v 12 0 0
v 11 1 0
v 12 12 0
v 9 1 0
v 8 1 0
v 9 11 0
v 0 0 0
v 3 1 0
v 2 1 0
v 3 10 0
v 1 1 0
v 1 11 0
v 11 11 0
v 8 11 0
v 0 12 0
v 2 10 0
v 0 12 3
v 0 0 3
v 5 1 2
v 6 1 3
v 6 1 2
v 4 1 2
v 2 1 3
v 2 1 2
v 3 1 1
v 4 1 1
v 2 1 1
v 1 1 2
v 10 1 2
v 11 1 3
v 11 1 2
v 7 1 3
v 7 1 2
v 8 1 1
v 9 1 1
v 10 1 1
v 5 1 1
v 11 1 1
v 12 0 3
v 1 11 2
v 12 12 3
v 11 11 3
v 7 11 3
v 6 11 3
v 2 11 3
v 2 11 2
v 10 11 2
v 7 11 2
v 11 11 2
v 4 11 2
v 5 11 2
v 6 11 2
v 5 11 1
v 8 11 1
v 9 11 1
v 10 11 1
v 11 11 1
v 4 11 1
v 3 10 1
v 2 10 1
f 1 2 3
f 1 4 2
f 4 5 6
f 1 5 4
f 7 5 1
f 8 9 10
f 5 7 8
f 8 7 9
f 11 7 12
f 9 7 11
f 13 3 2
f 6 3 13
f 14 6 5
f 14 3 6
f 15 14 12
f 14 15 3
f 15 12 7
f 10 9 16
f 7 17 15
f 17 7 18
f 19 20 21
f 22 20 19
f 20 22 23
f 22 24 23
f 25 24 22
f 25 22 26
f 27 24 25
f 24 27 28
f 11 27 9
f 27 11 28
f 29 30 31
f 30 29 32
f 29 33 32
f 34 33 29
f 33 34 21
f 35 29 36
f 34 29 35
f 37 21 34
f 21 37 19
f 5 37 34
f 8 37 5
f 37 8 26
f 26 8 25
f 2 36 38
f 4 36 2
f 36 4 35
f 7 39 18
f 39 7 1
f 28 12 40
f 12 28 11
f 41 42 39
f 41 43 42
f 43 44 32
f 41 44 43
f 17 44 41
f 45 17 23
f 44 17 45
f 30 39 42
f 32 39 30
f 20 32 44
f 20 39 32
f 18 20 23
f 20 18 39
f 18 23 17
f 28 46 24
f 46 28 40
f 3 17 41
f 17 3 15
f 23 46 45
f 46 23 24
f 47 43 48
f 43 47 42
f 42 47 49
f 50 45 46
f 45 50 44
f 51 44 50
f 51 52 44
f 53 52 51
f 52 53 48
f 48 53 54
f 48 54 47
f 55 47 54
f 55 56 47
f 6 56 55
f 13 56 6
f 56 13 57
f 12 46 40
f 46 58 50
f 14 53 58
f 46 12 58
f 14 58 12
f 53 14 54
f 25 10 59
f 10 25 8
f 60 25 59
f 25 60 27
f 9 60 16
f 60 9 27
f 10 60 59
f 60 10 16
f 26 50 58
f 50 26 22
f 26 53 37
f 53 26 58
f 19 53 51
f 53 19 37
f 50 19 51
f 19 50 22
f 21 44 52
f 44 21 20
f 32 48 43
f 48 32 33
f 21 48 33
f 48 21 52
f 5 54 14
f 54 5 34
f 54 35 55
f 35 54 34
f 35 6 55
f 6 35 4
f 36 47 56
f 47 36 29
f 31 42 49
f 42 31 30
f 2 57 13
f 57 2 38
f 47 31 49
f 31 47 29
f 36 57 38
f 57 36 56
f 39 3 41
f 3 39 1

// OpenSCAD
union() {
    translate([0, 0, 0]) cube([1, 1, 1]);
    translate([0, 0, 1]) cube([1, 1, 1]);
    translate([0, 0, 2]) cube([1, 1, 1]);
    translate([0, 1, 0]) cube([1, 1, 1]);
    translate([0, 1, 1]) cube([1, 1, 1]);
    translate([0, 1, 2]) cube([1, 1, 1]);
    translate([0, 2, 0]) cube([1, 1, 1]);
    translate([0, 2, 1]) cube([1, 1, 1]);
    translate([0, 2, 2]) cube([1, 1, 1]);
    translate([0, 3, 0]) cube([1, 1, 1]);
    translate([0, 3, 1]) cube([1, 1, 1]);
    translate([0, 3, 2]) cube([1, 1, 1]);
    translate([0, 4, 0]) cube([1, 1, 1]);
    translate([0, 4, 1]) cube([1, 1, 1]);
    translate([0, 4, 2]) cube([1, 1, 1]);
    translate([0, 5, 0]) cube([1, 1, 1]);
    translate([0, 5, 1]) cube([1, 1, 1]);
    translate([0, 5, 2]) cube([1, 1, 1]);
    translate([0, 6, 0]) cube([1, 1, 1]);
    translate([0, 6, 1]) cube([1, 1, 1]);
    translate([0, 6, 2]) cube([1, 1, 1]);
    translate([0, 7, 0]) cube([1, 1, 1]);
    translate([0, 7, 1]) cube([1, 1, 1]);
    translate([0, 7, 2]) cube([1, 1, 1]);
    translate([0, 8, 0]) cube([1, 1, 1]);
    translate([0, 8, 1]) cube([1, 1, 1]);
    translate([0, 8, 2]) cube([1, 1, 1]);
    translate([0, 9, 0]) cube([1, 1, 1]);
    translate([0, 9, 1]) cube([1, 1, 1]);
    translate([0, 9, 2]) cube([1, 1, 1]);
    translate([0, 10, 0]) cube([1, 1, 1]);
    translate([0, 10, 1]) cube([1, 1, 1]);
    translate([0, 10, 2]) cube([1, 1, 1]);
    translate([0, 11, 0]) cube([1, 1, 1]);
    translate([0, 11, 1]) cube([1, 1, 1]);
    translate([0, 11, 2]) cube([1, 1, 1]);
    translate([1, 0, 0]) cube([1, 1, 1]);
    translate([1, 0, 1]) cube([1, 1, 1]);
    translate([1, 0, 2]) cube([1, 1, 1]);
    translate([1, 1, 2]) cube([1, 1, 1]);
    translate([1, 2, 2]) cube([1, 1, 1]);
    translate([1, 3, 2]) cube([1, 1, 1]);
    translate([1, 4, 2]) cube([1, 1, 1]);
    translate([1, 5, 2]) cube([1, 1, 1]);
    translate([1, 6, 2]) cube([1, 1, 1]);
    translate([1, 7, 2]) cube([1, 1, 1]);
    translate([1, 8, 2]) cube([1, 1, 1]);
    translate([1, 9, 2]) cube([1, 1, 1]);
    translate([1, 10, 2]) cube([1, 1, 1]);
    translate([1, 11, 0]) cube([1, 1, 1]);
    translate([1, 11, 1]) cube([1, 1, 1]);
    translate([1, 11, 2]) cube([1, 1, 1]);
    translate([2, 0, 0]) cube([1, 1, 1]);
    translate([2, 0, 1]) cube([1, 1, 1]);
    translate([2, 0, 2]) cube([1, 1, 1]);
    translate([2, 1, 0]) cube([1, 1, 1]);
    translate([2, 2, 0]) cube([1, 1, 1]);
    translate([2, 3, 0]) cube([1, 1, 1]);
    translate([2, 4, 0]) cube([1, 1, 1]);
    translate([2, 5, 0]) cube([1, 1, 1]);
    translate([2, 6, 0]) cube([1, 1, 1]);
    translate([2, 7, 0]) cube([1, 1, 1]);
    translate([2, 8, 0]) cube([1, 1, 1]);
    translate([2, 9, 0]) cube([1, 1, 1]);
    translate([2, 11, 0]) cube([1, 1, 1]);
    translate([2, 11, 1]) cube([1, 1, 1]);
    translate([2, 11, 2]) cube([1, 1, 1]);
    translate([3, 0, 0]) cube([1, 1, 1]);
    translate([3, 0, 1]) cube([1, 1, 1]);
    translate([3, 0, 2]) cube([1, 1, 1]);
    translate([3, 11, 0]) cube([1, 1, 1]);
    translate([3, 11, 1]) cube([1, 1, 1]);
    translate([3, 11, 2]) cube([1, 1, 1]);
    translate([4, 0, 0]) cube([1, 1, 1]);
    translate([4, 0, 1]) cube([1, 1, 1]);
    translate([4, 0, 2]) cube([1, 1, 1]);
    translate([4, 1, 1]) cube([1, 1, 1]);
    translate([4, 2, 1]) cube([1, 1, 1]);
    translate([4, 3, 1]) cube([1, 1, 1]);
    translate([4, 4, 1]) cube([1, 1, 1]);
    translate([4, 5, 1]) cube([1, 1, 1]);
    translate([4, 6, 1]) cube([1, 1, 1]);
    translate([4, 7, 1]) cube([1, 1, 1]);
    translate([4, 8, 1]) cube([1, 1, 1]);
    translate([4, 9, 1]) cube([1, 1, 1]);
    translate([4, 10, 1]) cube([1, 1, 1]);
    translate([4, 11, 0]) cube([1, 1, 1]);
    translate([4, 11, 1]) cube([1, 1, 1]);
    translate([4, 11, 2]) cube([1, 1, 1]);
    translate([5, 0, 0]) cube([1, 1, 1]);
    translate([5, 0, 1]) cube([1, 1, 1]);
    translate([5, 0, 2]) cube([1, 1, 1]);
    translate([5, 11, 0]) cube([1, 1, 1]);
    translate([5, 11, 1]) cube([1, 1, 1]);
    translate([5, 11, 2]) cube([1, 1, 1]);
    translate([6, 0, 0]) cube([1, 1, 1]);
    translate([6, 0, 1]) cube([1, 1, 1]);
    translate([6, 0, 2]) cube([1, 1, 1]);
    translate([6, 1, 2]) cube([1, 1, 1]);
    translate([6, 2, 2]) cube([1, 1, 1]);
    translate([6, 3, 2]) cube([1, 1, 1]);
    translate([6, 4, 2]) cube([1, 1, 1]);
    translate([6, 5, 2]) cube([1, 1, 1]);
    translate([6, 6, 2]) cube([1, 1, 1]);
    translate([6, 7, 2]) cube([1, 1, 1]);
    translate([6, 8, 2]) cube([1, 1, 1]);
    translate([6, 9, 2]) cube([1, 1, 1]);
    translate([6, 10, 2]) cube([1, 1, 1]);
    translate([6, 11, 0]) cube([1, 1, 1]);
    translate([6, 11, 1]) cube([1, 1, 1]);
    translate([6, 11, 2]) cube([1, 1, 1]);
    translate([7, 0, 0]) cube([1, 1, 1]);
    translate([7, 0, 1]) cube([1, 1, 1]);
    translate([7, 0, 2]) cube([1, 1, 1]);
    translate([7, 11, 0]) cube([1, 1, 1]);
    translate([7, 11, 1]) cube([1, 1, 1]);
    translate([7, 11, 2]) cube([1, 1, 1]);
    translate([8, 0, 0]) cube([1, 1, 1]);
    translate([8, 0, 1]) cube([1, 1, 1]);
    translate([8, 0, 2]) cube([1, 1, 1]);
    translate([8, 1, 0]) cube([1, 1, 1]);
    translate([8, 2, 0]) cube([1, 1, 1]);
    translate([8, 3, 0]) cube([1, 1, 1]);
    translate([8, 4, 0]) cube([1, 1, 1]);
    translate([8, 5, 0]) cube([1, 1, 1]);
    translate([8, 6, 0]) cube([1, 1, 1]);
    translate([8, 7, 0]) cube([1, 1, 1]);
    translate([8, 8, 0]) cube([1, 1, 1]);
    translate([8, 9, 0]) cube([1, 1, 1]);
    translate([8, 10, 0]) cube([1, 1, 1]);
    translate([8, 11, 0]) cube([1, 1, 1]);
    translate([8, 11, 1]) cube([1, 1, 1]);
    translate([8, 11, 2]) cube([1, 1, 1]);
    translate([9, 0, 0]) cube([1, 1, 1]);
    translate([9, 0, 1]) cube([1, 1, 1]);
    translate([9, 0, 2]) cube([1, 1, 1]);
    translate([9, 11, 0]) cube([1, 1, 1]);
    translate([9, 11, 1]) cube([1, 1, 1]);
    translate([9, 11, 2]) cube([1, 1, 1]);
    translate([10, 0, 0]) cube([1, 1, 1]);
    translate([10, 0, 1]) cube([1, 1, 1]);
    translate([10, 0, 2]) cube([1, 1, 1]);
    translate([10, 1, 1]) cube([1, 1, 1]);
    translate([10, 2, 1]) cube([1, 1, 1]);
    translate([10, 3, 1]) cube([1, 1, 1]);
    translate([10, 4, 1]) cube([1, 1, 1]);
    translate([10, 5, 1]) cube([1, 1, 1]);
    translate([10, 6, 1]) cube([1, 1, 1]);
    translate([10, 7, 1]) cube([1, 1, 1]);
    translate([10, 8, 1]) cube([1, 1, 1]);
    translate([10, 9, 1]) cube([1, 1, 1]);
    translate([10, 10, 1]) cube([1, 1, 1]);
    translate([10, 11, 0]) cube([1, 1, 1]);
    translate([10, 11, 1]) cube([1, 1, 1]);
    translate([10, 11, 2]) cube([1, 1, 1]);
    translate([11, 0, 0]) cube([1, 1, 1]);
    translate([11, 0, 1]) cube([1, 1, 1]);
    translate([11, 0, 2]) cube([1, 1, 1]);
    translate([11, 1, 0]) cube([1, 1, 1]);
    translate([11, 1, 1]) cube([1, 1, 1]);
    translate([11, 1, 2]) cube([1, 1, 1]);
    translate([11, 2, 0]) cube([1, 1, 1]);
    translate([11, 2, 1]) cube([1, 1, 1]);
    translate([11, 2, 2]) cube([1, 1, 1]);
    translate([11, 3, 0]) cube([1, 1, 1]);
    translate([11, 3, 1]) cube([1, 1, 1]);
    translate([11, 3, 2]) cube([1, 1, 1]);
    translate([11, 4, 0]) cube([1, 1, 1]);
    translate([11, 4, 1]) cube([1, 1, 1]);
    translate([11, 4, 2]) cube([1, 1, 1]);
    translate([11, 5, 0]) cube([1, 1, 1]);
    translate([11, 5, 1]) cube([1, 1, 1]);
    translate([11, 5, 2]) cube([1, 1, 1]);
    translate([11, 6, 0]) cube([1, 1, 1]);
    translate([11, 6, 1]) cube([1, 1, 1]);
    translate([11, 6, 2]) cube([1, 1, 1]);
    translate([11, 7, 0]) cube([1, 1, 1]);
    translate([11, 7, 1]) cube([1, 1, 1]);
    translate([11, 7, 2]) cube([1, 1, 1]);
    translate([11, 8, 0]) cube([1, 1, 1]);
    translate([11, 8, 1]) cube([1, 1, 1]);
    translate([11, 8, 2]) cube([1, 1, 1]);
    translate([11, 9, 0]) cube([1, 1, 1]);
    translate([11, 9, 1]) cube([1, 1, 1]);
    translate([11, 9, 2]) cube([1, 1, 1]);
    translate([11, 10, 0]) cube([1, 1, 1]);
    translate([11, 10, 1]) cube([1, 1, 1]);
    translate([11, 10, 2]) cube([1, 1, 1]);
    translate([11, 11, 0]) cube([1, 1, 1]);
    translate([11, 11, 1]) cube([1, 1, 1]);
    translate([11, 11, 2]) cube([1, 1, 1]);
}
